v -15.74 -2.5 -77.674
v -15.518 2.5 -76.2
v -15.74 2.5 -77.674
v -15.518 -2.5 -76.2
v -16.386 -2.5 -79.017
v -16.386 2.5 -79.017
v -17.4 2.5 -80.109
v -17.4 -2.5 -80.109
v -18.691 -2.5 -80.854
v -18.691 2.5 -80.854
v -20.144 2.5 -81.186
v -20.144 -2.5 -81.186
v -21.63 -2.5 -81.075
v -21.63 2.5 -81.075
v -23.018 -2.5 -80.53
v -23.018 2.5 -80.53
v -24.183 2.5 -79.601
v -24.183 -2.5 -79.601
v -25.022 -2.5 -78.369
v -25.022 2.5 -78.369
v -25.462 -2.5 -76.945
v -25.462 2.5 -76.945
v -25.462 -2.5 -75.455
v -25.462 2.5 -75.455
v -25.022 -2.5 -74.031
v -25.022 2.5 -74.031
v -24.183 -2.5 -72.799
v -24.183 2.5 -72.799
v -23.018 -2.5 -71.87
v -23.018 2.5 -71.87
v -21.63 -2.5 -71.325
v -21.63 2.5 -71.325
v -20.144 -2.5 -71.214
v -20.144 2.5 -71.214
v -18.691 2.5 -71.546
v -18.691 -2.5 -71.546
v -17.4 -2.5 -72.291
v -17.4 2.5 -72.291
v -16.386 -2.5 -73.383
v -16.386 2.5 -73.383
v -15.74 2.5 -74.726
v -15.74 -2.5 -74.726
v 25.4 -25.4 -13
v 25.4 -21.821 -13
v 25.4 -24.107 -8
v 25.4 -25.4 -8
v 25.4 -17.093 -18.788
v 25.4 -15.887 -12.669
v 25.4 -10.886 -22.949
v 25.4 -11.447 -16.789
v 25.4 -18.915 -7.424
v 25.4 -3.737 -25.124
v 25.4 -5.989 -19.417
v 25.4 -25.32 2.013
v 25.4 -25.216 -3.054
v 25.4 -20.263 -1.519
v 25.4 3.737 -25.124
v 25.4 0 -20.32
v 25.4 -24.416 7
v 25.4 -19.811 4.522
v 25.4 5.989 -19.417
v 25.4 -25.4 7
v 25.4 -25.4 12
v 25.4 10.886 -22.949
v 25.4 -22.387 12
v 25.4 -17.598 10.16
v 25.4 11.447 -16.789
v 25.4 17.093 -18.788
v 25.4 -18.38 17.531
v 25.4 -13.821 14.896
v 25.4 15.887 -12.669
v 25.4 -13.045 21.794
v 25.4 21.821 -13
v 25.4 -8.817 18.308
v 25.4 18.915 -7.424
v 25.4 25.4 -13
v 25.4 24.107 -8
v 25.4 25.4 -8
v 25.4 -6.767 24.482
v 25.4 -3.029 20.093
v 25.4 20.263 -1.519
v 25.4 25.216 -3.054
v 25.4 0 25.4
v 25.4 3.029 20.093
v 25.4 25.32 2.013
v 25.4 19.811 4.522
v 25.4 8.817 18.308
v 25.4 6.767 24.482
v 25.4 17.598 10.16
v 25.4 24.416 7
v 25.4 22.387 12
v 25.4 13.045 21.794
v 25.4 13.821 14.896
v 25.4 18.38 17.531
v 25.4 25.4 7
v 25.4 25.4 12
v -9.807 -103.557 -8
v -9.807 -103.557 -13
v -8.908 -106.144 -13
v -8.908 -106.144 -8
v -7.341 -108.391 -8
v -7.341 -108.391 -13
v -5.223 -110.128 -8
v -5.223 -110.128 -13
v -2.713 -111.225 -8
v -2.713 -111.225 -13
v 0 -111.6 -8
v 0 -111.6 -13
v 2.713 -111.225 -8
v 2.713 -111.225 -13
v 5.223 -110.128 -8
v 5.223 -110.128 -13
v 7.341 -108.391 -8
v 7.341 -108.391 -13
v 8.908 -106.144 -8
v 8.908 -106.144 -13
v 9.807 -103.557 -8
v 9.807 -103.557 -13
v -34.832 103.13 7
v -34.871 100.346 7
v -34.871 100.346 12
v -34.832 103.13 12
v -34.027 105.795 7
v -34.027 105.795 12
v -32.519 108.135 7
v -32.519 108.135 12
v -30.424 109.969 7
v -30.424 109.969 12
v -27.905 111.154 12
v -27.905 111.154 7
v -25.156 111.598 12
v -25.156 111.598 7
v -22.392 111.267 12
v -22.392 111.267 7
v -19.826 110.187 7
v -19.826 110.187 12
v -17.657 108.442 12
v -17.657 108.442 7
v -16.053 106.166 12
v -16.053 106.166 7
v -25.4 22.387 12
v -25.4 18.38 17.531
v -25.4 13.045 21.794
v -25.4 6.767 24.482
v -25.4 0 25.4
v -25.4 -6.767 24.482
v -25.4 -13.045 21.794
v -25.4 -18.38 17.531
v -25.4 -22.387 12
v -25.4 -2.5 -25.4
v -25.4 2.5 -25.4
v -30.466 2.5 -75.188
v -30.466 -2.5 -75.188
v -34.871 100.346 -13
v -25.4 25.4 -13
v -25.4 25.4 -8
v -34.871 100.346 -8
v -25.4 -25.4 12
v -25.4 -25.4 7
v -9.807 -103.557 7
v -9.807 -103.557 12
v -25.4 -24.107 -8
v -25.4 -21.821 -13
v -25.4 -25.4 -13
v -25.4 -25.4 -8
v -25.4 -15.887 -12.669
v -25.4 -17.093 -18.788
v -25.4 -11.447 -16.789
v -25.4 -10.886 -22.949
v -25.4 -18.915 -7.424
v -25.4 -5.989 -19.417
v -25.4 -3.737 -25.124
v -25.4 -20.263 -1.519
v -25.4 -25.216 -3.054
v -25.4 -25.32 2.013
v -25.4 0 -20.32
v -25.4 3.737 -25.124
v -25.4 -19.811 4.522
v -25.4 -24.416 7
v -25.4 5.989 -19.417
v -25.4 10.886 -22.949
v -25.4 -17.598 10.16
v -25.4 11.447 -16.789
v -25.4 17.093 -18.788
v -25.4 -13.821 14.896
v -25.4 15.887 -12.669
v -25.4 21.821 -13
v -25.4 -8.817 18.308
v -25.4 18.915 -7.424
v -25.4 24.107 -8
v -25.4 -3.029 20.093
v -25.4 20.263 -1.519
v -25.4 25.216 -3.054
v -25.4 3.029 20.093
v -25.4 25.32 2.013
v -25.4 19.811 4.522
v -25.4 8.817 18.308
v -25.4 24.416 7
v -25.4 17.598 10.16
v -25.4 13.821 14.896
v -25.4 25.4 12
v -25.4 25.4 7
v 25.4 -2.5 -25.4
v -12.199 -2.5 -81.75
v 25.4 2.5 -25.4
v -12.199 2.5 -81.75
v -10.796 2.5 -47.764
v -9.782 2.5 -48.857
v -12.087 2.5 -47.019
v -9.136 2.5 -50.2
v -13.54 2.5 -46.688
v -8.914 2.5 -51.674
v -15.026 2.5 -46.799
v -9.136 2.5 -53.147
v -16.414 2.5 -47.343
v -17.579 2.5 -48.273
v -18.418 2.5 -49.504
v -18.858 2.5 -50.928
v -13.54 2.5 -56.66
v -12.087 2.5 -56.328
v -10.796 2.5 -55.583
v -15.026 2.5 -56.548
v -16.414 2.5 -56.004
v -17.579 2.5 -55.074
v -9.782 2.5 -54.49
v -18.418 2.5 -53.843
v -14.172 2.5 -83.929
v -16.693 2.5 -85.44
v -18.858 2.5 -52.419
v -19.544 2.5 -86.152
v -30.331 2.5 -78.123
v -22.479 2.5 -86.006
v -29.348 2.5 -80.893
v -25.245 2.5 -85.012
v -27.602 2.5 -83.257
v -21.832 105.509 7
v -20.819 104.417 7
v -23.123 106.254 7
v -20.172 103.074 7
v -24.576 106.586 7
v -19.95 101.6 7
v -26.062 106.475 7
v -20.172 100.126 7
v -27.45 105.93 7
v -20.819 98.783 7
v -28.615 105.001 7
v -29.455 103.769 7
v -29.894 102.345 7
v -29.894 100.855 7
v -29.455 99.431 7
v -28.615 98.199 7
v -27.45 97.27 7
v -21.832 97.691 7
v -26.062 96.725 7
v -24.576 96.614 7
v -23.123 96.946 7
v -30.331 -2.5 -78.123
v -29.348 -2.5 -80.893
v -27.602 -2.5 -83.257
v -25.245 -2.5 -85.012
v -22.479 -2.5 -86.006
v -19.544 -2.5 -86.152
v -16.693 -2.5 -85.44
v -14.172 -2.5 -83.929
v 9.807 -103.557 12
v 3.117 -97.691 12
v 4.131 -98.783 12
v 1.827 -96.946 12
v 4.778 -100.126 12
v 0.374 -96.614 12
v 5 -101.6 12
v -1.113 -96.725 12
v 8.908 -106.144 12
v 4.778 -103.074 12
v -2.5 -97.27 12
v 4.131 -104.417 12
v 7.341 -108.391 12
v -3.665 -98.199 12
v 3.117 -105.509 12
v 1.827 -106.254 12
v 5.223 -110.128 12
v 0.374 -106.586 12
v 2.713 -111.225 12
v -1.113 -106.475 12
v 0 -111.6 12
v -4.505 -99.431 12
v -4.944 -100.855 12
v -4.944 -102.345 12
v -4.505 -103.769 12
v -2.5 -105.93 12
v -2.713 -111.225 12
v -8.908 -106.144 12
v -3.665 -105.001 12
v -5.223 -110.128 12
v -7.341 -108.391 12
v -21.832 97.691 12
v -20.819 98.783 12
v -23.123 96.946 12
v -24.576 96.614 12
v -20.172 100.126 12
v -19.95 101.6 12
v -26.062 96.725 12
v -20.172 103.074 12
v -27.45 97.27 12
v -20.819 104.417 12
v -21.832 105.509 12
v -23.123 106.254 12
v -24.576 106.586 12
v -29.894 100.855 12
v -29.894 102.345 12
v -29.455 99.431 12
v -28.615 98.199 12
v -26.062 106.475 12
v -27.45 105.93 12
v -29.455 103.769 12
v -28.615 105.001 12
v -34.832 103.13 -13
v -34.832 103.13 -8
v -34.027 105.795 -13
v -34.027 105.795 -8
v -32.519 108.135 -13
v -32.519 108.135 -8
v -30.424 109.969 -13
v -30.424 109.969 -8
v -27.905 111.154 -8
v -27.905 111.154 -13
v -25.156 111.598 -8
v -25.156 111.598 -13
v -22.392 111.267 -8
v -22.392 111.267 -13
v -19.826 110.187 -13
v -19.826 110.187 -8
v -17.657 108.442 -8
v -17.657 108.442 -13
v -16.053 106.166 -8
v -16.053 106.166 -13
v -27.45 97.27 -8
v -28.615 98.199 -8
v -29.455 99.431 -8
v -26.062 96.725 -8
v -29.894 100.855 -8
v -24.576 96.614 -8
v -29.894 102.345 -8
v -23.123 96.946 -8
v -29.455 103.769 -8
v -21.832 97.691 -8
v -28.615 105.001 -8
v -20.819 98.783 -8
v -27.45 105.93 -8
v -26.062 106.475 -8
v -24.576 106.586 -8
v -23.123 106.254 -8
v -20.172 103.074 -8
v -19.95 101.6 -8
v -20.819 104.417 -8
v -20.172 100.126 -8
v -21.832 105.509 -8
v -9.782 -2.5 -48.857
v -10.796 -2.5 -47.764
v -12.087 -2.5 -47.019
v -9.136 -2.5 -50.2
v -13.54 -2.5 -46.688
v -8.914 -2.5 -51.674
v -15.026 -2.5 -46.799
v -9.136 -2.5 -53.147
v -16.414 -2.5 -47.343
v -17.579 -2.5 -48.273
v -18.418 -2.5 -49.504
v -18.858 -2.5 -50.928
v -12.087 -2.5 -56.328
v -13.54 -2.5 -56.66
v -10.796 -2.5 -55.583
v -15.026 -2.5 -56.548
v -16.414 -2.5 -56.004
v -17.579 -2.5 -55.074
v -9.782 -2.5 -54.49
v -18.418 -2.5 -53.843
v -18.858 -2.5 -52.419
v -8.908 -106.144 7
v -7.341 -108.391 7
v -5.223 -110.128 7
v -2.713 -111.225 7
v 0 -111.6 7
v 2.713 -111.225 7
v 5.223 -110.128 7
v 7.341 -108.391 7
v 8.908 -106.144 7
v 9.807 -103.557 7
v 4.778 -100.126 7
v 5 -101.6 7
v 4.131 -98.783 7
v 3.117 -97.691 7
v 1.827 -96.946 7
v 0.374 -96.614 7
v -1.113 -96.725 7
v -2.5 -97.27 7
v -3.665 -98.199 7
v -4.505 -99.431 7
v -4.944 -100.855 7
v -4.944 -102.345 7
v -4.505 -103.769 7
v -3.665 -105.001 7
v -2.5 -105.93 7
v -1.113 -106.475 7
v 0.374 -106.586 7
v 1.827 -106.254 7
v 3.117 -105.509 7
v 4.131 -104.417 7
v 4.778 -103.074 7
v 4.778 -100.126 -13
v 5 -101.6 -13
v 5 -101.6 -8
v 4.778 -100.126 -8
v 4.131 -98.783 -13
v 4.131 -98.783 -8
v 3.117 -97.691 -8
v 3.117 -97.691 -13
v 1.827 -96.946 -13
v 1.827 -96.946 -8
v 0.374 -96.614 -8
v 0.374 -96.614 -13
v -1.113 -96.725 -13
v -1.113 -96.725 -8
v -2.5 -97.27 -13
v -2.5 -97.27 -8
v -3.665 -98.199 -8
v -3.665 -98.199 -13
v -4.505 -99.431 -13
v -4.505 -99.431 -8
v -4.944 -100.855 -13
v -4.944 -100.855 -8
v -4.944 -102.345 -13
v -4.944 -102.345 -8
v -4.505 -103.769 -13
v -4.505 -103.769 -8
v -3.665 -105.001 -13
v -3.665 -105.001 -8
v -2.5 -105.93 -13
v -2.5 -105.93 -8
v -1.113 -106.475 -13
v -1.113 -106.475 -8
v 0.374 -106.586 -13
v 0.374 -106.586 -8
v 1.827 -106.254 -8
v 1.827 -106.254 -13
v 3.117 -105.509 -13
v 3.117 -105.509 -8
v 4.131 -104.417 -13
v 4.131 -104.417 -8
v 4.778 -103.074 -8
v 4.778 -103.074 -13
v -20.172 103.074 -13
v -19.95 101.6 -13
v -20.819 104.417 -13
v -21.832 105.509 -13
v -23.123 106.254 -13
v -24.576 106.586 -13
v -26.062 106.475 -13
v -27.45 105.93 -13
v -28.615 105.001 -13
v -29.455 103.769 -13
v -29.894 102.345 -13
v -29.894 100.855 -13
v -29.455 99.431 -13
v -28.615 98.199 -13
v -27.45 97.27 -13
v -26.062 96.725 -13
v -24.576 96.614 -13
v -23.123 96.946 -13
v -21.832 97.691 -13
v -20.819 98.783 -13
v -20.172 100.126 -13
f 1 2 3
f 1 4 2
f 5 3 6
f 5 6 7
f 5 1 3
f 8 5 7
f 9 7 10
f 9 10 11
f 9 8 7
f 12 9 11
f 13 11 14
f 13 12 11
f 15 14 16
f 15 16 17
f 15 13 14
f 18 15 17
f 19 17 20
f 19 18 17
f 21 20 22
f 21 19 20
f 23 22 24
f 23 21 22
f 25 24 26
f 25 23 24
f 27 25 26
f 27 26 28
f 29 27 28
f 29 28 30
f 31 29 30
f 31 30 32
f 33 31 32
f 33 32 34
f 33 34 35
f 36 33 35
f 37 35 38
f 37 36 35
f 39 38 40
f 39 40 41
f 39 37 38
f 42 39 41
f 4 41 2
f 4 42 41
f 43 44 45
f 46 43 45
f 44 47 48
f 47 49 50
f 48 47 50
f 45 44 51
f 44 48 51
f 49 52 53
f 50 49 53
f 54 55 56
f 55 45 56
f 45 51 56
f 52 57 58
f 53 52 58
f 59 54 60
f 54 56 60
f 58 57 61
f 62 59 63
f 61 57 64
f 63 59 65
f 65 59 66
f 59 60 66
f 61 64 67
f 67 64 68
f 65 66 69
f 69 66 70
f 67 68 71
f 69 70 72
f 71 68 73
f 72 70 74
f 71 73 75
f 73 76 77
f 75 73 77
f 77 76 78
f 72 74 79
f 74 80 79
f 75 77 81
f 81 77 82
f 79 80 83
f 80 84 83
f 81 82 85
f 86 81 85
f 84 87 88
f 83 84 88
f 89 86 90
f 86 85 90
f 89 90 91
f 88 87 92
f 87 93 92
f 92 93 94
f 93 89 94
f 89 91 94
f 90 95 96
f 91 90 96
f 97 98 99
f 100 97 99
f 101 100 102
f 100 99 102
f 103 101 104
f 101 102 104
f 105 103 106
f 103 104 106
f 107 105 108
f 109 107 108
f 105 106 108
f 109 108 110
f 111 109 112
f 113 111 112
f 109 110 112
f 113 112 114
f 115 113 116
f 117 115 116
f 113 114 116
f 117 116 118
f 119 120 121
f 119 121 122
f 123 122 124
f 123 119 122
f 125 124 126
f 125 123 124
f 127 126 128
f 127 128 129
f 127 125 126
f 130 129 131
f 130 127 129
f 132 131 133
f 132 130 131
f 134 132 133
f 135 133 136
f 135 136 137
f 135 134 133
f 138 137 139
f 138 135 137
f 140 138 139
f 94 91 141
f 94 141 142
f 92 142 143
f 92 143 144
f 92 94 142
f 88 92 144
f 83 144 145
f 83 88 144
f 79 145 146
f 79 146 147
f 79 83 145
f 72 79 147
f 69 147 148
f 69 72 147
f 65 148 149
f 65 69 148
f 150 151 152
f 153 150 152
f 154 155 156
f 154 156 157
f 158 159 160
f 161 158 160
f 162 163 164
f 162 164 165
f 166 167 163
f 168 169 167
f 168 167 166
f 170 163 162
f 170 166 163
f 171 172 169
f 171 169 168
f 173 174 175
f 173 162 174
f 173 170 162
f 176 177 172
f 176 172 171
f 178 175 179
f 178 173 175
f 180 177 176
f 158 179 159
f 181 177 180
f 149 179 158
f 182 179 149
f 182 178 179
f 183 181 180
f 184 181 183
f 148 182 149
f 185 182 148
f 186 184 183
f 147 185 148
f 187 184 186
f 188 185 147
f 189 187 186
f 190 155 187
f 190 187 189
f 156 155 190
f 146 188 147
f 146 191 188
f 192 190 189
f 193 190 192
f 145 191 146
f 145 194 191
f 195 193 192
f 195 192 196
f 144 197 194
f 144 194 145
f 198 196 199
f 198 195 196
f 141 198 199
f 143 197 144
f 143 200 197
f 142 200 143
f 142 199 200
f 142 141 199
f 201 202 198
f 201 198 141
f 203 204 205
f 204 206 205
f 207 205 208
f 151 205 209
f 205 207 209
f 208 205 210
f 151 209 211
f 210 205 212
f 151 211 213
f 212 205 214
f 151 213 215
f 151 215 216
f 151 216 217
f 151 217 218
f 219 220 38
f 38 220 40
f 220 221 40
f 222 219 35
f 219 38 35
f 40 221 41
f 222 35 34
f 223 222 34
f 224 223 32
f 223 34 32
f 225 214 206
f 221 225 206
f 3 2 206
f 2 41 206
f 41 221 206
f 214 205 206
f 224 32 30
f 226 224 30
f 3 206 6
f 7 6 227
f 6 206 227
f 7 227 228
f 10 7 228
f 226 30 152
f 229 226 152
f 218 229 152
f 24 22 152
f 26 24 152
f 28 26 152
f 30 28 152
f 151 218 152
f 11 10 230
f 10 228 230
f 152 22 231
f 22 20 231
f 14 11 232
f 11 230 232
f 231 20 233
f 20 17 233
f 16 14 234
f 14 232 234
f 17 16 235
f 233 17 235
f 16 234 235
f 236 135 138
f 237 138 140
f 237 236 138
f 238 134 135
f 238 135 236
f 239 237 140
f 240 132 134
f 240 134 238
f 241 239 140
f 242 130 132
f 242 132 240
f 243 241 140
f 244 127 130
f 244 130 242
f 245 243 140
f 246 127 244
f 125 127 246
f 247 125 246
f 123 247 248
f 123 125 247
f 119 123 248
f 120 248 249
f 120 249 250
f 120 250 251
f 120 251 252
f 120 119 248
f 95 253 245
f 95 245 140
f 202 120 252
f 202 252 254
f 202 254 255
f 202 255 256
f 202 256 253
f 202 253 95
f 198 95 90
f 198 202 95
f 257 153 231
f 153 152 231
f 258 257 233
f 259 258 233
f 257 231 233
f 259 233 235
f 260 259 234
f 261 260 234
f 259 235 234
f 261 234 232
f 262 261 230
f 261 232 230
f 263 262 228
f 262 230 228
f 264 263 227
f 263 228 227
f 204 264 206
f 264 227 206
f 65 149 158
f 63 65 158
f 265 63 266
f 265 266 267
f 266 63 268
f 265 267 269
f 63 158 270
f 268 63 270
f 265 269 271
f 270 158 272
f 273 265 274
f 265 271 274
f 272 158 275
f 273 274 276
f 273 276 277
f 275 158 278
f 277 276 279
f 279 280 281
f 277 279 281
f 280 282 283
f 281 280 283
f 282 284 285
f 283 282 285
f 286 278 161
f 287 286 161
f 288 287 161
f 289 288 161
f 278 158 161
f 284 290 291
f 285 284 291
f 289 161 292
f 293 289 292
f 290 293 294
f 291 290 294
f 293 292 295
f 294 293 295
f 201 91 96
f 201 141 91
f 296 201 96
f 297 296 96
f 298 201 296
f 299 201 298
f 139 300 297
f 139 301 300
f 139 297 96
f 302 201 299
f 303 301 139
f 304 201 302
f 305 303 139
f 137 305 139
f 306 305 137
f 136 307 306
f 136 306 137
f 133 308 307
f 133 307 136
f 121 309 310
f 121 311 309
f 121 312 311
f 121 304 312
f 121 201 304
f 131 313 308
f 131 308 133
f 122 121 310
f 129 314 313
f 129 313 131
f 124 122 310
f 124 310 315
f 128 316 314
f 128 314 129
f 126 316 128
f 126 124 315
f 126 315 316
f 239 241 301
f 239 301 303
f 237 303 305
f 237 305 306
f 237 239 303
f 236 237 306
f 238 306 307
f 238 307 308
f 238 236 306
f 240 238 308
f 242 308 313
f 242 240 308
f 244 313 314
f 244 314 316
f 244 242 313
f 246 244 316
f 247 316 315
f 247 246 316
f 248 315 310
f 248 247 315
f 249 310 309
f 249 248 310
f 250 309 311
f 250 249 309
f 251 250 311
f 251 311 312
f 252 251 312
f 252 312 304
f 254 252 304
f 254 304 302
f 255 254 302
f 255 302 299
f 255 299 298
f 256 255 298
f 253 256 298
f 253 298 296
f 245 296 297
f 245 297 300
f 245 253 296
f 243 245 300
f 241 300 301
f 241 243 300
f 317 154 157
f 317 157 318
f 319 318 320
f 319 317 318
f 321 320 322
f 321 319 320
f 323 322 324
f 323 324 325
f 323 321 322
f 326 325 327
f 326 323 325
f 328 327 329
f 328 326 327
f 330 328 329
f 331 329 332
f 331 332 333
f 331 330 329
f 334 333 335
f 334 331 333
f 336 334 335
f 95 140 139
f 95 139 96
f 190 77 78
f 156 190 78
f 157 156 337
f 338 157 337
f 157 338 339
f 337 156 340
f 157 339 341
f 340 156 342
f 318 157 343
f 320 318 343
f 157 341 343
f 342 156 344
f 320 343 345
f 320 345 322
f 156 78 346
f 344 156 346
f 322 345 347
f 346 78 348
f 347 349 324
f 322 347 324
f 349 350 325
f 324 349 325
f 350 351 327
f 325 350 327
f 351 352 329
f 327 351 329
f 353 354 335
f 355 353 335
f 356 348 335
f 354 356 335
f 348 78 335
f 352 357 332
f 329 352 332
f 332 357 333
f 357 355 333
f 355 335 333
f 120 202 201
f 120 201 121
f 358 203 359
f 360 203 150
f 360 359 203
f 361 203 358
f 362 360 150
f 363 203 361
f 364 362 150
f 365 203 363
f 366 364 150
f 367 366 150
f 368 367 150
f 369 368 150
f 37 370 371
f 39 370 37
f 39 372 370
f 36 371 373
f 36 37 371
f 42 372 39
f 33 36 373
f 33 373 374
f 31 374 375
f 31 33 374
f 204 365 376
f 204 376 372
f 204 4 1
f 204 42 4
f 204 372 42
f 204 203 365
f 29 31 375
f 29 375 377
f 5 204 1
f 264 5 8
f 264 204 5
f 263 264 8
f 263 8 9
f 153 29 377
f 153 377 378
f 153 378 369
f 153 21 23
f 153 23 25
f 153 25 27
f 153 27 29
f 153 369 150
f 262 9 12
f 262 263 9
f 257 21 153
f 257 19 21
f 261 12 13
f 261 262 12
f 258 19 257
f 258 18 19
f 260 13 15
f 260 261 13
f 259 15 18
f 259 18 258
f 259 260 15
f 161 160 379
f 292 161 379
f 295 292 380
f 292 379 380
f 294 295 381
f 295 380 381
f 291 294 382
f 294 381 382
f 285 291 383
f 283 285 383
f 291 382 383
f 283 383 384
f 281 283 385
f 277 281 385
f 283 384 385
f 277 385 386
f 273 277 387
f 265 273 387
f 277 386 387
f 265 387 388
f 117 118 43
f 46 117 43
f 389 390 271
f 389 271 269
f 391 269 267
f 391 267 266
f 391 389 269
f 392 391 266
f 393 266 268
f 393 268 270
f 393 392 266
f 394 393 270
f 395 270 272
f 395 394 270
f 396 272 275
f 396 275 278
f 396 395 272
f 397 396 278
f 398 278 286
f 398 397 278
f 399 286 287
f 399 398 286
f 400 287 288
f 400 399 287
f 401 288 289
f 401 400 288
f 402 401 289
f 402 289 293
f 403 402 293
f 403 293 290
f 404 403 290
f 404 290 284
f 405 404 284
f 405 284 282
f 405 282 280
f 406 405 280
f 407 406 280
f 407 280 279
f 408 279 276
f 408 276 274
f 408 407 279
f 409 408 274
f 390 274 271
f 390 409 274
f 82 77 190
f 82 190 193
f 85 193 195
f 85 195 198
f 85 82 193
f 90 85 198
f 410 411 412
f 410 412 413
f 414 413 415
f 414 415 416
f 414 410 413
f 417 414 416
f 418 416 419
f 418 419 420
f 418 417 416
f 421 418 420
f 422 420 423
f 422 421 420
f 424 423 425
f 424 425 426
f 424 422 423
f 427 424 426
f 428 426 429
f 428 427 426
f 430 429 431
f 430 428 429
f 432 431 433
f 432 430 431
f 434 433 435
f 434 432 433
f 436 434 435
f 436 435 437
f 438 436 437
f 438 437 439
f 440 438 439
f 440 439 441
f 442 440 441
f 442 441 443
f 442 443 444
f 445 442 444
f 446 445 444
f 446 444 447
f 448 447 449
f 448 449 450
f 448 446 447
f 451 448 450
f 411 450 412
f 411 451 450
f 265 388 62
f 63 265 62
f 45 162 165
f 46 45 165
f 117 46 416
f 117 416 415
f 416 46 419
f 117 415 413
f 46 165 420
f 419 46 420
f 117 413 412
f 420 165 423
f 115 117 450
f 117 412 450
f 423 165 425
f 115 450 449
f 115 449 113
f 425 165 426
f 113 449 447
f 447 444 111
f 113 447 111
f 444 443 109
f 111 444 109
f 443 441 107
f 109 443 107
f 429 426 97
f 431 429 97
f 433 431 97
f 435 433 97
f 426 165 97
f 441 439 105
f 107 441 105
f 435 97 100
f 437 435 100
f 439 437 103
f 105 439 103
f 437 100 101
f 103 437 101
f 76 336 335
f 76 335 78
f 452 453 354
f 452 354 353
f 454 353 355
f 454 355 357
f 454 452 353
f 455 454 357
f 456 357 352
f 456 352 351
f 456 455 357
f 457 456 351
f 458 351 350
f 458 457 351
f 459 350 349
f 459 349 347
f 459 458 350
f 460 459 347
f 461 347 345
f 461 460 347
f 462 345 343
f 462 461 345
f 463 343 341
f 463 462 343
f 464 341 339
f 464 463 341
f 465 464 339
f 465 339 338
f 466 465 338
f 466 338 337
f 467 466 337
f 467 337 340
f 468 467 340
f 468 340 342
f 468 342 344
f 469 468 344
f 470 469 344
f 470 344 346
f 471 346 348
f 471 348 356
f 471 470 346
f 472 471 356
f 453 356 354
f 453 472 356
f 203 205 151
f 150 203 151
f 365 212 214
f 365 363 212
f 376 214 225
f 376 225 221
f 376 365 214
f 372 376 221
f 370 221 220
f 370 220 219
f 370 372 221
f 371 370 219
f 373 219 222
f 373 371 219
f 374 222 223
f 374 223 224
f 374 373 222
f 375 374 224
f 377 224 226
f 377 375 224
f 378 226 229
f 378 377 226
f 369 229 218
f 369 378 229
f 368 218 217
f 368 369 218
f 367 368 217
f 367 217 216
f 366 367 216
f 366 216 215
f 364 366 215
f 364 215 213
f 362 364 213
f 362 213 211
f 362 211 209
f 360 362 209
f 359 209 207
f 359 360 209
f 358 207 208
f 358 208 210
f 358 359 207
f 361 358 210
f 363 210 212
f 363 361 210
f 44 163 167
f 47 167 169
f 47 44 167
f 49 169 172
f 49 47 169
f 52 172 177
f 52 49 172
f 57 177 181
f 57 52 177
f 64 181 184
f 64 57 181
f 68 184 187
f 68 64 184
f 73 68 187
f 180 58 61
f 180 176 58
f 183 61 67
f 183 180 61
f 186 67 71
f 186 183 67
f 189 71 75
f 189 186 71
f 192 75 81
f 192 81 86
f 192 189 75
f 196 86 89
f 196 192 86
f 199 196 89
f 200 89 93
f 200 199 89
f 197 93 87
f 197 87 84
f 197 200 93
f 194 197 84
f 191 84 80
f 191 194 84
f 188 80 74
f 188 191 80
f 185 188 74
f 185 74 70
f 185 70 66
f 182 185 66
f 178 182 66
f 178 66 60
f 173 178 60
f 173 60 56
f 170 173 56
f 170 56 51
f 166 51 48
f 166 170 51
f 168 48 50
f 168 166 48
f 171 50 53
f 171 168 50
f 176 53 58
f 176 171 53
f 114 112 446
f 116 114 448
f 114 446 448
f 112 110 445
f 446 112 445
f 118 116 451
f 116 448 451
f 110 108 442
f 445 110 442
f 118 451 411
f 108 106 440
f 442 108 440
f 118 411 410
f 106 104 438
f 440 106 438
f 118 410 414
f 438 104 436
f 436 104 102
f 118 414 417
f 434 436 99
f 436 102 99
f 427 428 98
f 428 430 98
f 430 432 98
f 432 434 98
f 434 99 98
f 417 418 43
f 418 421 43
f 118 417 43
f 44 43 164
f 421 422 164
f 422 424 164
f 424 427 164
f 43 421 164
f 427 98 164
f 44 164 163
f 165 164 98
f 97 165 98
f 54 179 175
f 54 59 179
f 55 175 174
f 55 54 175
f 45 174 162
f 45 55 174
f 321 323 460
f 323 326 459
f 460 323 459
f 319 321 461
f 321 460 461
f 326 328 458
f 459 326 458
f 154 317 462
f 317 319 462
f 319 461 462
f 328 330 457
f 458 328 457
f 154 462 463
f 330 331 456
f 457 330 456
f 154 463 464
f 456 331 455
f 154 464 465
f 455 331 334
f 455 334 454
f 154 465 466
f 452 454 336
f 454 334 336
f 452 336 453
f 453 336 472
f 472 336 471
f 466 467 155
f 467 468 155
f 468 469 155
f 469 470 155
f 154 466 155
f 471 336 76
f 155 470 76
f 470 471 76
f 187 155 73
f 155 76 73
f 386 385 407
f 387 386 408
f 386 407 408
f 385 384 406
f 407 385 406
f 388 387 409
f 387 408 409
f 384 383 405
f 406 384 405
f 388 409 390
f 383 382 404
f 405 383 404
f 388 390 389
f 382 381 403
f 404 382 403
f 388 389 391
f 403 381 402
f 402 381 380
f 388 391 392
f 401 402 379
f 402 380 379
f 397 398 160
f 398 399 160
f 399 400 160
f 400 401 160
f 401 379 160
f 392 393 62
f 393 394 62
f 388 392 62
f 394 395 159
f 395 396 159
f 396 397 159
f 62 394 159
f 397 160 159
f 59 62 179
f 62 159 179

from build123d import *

# Parameters (mm, degrees)
SKETCH2_R             = 25.4
SKETCH2_R_2           = 20.32
BOSS_EXTRUDE1_DEPTH   = 25.4
BOSS_EXTRUDE2_START   = 7
SKETCH3_R             = 5
BOSS_EXTRUDE2_DEPTH   = 5
BOSS_EXTRUDE2_2_DEPTH = 5
BOSS_EXTRUDE4_START   = -13
SKETCH3_3_R           = 5
BOSS_EXTRUDE4_DEPTH   = 5
BOSS_EXTRUDE4_2_DEPTH = 5
BOSS_EXTRUDE5_DEPTH   = 25.4
SKETCH6_R             = 5
BOSS_EXTRUDE6_DEPTH   = 2.5


with BuildPart() as part:
    # Sketch2 → Boss-Extrude1 (new, symmetric)
    with BuildSketch(Plane(origin=(0, 0, 0), x_dir=(0, 0, -1), z_dir=(1, 0, 0))):
        Circle(SKETCH2_R)
        Circle(SKETCH2_R_2, mode=Mode.SUBTRACT)
    extrude(amount=BOSS_EXTRUDE1_DEPTH, both=True)



with BuildPart() as body_2:
    # Sketch3 → Boss-Extrude2 (new body)
    with BuildSketch(Plane.XY.offset(BOSS_EXTRUDE2_START)):
        with BuildLine():
            Line((-25.4, 25.4), (-34.870920337, 100.346276275))
            ThreePointArc((-34.870920337, 100.346276275), (-27.904518621, 111.153521469), (-16.053197995, 106.166187415))
            Line((-16.053197995, 106.166187415), (25.4, 25.4))
            Line((25.4, 25.4), (-25.4, 25.4))
        make_face()
        with Locations((-24.949822775, 101.6)):
            Circle(SKETCH3_R, mode=Mode.SUBTRACT)
    extrude(amount=BOSS_EXTRUDE2_DEPTH)


with BuildPart() as body_3:
    # Sketch3 → Boss-Extrude2 2 (new body)
    with BuildSketch(Plane.XY.offset(BOSS_EXTRUDE2_START)):
        with BuildLine():
            Line((-25.4, -25.4), (-9.806723533, -103.556571886))
            ThreePointArc((-9.806723533, -103.556571886), (0, -111.6), (9.806723533, -103.556571886))
            Line((9.806723533, -103.556571886), (25.4, -25.4))
            Line((25.4, -25.4), (-25.4, -25.4))
        make_face()
        with Locations((0, -101.6)):
            Circle(SKETCH3_R, mode=Mode.SUBTRACT)
    extrude(amount=BOSS_EXTRUDE2_2_DEPTH)


with BuildPart() as body_4:
    # Sketch3<3> → Boss-Extrude4 (new body)
    with BuildSketch(Plane.XY.offset(BOSS_EXTRUDE4_START)):
        with BuildLine():
            Line((-25.4, 25.4), (-34.870920337, 100.346276275))
            ThreePointArc((-34.870920337, 100.346276275), (-27.904518621, 111.153521469), (-16.053197995, 106.166187415))
            Line((-16.053197995, 106.166187415), (25.4, 25.4))
            Line((25.4, 25.4), (-25.4, 25.4))
        make_face()
        with Locations((-24.949822775, 101.6)):
            Circle(SKETCH3_3_R, mode=Mode.SUBTRACT)
    extrude(amount=BOSS_EXTRUDE4_DEPTH)


with BuildPart() as body_5:
    # Sketch3<3> → Boss-Extrude4 2 (new body)
    with BuildSketch(Plane.XY.offset(BOSS_EXTRUDE4_START)):
        with BuildLine():
            Line((-25.4, -25.4), (-9.806723533, -103.556571886))
            ThreePointArc((-9.806723533, -103.556571886), (0, -111.6), (9.806723533, -103.556571886))
            Line((9.806723533, -103.556571886), (25.4, -25.4))
            Line((25.4, -25.4), (-25.4, -25.4))
        make_face()
        with Locations((0, -101.6)):
            Circle(SKETCH3_3_R, mode=Mode.SUBTRACT)
    extrude(amount=BOSS_EXTRUDE4_2_DEPTH)


with BuildPart() as part_1:
    add(part.part)

    add(body_2.part)  # Boss-Extrude5 merges body 2

    add(body_3.part)  # Boss-Extrude5 merges body 3

    add(body_4.part)  # Boss-Extrude5 merges body 4

    add(body_5.part)  # Boss-Extrude5 merges body 5
    # Sketch5 → Boss-Extrude5 (add, symmetric)
    with BuildSketch(Plane(origin=(0, 0, 0), x_dir=(0, 0, -1), z_dir=(1, 0, 0))):
        with BuildLine():
            Line((8, -25.4), (13, -25.4))
            Line((13, -25.4), (13, -21.821090715))
            ThreePointArc((13, -21.821090715), (10.562037818, -23.099856215), (8, -24.107260317))
            Line((8, -24.107260317), (8, -25.4))
        make_face()
        with BuildLine():
            Line((-12, -25.4), (-7, -25.4))
            Line((-7, -25.4), (-7, -24.416387939))
            ThreePointArc((-7, -24.416387939), (-9.554057075, -23.534655158), (-12, -22.386603137))
            Line((-12, -22.386603137), (-12, -25.4))
        make_face()
        with BuildLine():
            Line((-12, 25.4), (-7, 25.4))
            Line((-7, 25.4), (-7, 24.416387939))
            ThreePointArc((-7, 24.416387939), (-9.554057075, 23.534655158), (-12, 22.386603137))
            Line((-12, 22.386603137), (-12, 25.4))
        make_face()
        with BuildLine():
            Line((8, 25.4), (13, 25.4))
            Line((13, 25.4), (13, 21.821090715))
            ThreePointArc((13, 21.821090715), (10.562037818, 23.099856215), (8, 24.107260317))
            Line((8, 24.107260317), (8, 25.4))
        make_face()
    extrude(amount=BOSS_EXTRUDE5_DEPTH, both=True)


with BuildPart() as body_2_2:
    # Sketch6 → Boss-Extrude6 (new, symmetric)
    with BuildSketch(Plane(origin=(0, 0, 0), x_dir=(1, 0, 0), z_dir=(0, 1, 0))):
        with BuildLine():
            Line((-25.4, 25.4), (-30.466168735, 75.18767257))
            ThreePointArc((-30.466168735, 75.18767257), (-23.898598023, 85.611081427), (-12.199244226, 81.750309743))
            Line((-12.199244226, 81.750309743), (25.4, 25.4))
            Line((25.4, 25.4), (-25.4, 25.4))
        make_face()
        with Locations((-20.517541032, 76.2)):
            Circle(SKETCH6_R, mode=Mode.SUBTRACT)
        with Locations((-13.913567634, 51.673533981)):
            Circle(SKETCH6_R, mode=Mode.SUBTRACT)
    extrude(amount=BOSS_EXTRUDE6_DEPTH, both=True)


solid = Compound([part_1.part, body_2_2.part])
